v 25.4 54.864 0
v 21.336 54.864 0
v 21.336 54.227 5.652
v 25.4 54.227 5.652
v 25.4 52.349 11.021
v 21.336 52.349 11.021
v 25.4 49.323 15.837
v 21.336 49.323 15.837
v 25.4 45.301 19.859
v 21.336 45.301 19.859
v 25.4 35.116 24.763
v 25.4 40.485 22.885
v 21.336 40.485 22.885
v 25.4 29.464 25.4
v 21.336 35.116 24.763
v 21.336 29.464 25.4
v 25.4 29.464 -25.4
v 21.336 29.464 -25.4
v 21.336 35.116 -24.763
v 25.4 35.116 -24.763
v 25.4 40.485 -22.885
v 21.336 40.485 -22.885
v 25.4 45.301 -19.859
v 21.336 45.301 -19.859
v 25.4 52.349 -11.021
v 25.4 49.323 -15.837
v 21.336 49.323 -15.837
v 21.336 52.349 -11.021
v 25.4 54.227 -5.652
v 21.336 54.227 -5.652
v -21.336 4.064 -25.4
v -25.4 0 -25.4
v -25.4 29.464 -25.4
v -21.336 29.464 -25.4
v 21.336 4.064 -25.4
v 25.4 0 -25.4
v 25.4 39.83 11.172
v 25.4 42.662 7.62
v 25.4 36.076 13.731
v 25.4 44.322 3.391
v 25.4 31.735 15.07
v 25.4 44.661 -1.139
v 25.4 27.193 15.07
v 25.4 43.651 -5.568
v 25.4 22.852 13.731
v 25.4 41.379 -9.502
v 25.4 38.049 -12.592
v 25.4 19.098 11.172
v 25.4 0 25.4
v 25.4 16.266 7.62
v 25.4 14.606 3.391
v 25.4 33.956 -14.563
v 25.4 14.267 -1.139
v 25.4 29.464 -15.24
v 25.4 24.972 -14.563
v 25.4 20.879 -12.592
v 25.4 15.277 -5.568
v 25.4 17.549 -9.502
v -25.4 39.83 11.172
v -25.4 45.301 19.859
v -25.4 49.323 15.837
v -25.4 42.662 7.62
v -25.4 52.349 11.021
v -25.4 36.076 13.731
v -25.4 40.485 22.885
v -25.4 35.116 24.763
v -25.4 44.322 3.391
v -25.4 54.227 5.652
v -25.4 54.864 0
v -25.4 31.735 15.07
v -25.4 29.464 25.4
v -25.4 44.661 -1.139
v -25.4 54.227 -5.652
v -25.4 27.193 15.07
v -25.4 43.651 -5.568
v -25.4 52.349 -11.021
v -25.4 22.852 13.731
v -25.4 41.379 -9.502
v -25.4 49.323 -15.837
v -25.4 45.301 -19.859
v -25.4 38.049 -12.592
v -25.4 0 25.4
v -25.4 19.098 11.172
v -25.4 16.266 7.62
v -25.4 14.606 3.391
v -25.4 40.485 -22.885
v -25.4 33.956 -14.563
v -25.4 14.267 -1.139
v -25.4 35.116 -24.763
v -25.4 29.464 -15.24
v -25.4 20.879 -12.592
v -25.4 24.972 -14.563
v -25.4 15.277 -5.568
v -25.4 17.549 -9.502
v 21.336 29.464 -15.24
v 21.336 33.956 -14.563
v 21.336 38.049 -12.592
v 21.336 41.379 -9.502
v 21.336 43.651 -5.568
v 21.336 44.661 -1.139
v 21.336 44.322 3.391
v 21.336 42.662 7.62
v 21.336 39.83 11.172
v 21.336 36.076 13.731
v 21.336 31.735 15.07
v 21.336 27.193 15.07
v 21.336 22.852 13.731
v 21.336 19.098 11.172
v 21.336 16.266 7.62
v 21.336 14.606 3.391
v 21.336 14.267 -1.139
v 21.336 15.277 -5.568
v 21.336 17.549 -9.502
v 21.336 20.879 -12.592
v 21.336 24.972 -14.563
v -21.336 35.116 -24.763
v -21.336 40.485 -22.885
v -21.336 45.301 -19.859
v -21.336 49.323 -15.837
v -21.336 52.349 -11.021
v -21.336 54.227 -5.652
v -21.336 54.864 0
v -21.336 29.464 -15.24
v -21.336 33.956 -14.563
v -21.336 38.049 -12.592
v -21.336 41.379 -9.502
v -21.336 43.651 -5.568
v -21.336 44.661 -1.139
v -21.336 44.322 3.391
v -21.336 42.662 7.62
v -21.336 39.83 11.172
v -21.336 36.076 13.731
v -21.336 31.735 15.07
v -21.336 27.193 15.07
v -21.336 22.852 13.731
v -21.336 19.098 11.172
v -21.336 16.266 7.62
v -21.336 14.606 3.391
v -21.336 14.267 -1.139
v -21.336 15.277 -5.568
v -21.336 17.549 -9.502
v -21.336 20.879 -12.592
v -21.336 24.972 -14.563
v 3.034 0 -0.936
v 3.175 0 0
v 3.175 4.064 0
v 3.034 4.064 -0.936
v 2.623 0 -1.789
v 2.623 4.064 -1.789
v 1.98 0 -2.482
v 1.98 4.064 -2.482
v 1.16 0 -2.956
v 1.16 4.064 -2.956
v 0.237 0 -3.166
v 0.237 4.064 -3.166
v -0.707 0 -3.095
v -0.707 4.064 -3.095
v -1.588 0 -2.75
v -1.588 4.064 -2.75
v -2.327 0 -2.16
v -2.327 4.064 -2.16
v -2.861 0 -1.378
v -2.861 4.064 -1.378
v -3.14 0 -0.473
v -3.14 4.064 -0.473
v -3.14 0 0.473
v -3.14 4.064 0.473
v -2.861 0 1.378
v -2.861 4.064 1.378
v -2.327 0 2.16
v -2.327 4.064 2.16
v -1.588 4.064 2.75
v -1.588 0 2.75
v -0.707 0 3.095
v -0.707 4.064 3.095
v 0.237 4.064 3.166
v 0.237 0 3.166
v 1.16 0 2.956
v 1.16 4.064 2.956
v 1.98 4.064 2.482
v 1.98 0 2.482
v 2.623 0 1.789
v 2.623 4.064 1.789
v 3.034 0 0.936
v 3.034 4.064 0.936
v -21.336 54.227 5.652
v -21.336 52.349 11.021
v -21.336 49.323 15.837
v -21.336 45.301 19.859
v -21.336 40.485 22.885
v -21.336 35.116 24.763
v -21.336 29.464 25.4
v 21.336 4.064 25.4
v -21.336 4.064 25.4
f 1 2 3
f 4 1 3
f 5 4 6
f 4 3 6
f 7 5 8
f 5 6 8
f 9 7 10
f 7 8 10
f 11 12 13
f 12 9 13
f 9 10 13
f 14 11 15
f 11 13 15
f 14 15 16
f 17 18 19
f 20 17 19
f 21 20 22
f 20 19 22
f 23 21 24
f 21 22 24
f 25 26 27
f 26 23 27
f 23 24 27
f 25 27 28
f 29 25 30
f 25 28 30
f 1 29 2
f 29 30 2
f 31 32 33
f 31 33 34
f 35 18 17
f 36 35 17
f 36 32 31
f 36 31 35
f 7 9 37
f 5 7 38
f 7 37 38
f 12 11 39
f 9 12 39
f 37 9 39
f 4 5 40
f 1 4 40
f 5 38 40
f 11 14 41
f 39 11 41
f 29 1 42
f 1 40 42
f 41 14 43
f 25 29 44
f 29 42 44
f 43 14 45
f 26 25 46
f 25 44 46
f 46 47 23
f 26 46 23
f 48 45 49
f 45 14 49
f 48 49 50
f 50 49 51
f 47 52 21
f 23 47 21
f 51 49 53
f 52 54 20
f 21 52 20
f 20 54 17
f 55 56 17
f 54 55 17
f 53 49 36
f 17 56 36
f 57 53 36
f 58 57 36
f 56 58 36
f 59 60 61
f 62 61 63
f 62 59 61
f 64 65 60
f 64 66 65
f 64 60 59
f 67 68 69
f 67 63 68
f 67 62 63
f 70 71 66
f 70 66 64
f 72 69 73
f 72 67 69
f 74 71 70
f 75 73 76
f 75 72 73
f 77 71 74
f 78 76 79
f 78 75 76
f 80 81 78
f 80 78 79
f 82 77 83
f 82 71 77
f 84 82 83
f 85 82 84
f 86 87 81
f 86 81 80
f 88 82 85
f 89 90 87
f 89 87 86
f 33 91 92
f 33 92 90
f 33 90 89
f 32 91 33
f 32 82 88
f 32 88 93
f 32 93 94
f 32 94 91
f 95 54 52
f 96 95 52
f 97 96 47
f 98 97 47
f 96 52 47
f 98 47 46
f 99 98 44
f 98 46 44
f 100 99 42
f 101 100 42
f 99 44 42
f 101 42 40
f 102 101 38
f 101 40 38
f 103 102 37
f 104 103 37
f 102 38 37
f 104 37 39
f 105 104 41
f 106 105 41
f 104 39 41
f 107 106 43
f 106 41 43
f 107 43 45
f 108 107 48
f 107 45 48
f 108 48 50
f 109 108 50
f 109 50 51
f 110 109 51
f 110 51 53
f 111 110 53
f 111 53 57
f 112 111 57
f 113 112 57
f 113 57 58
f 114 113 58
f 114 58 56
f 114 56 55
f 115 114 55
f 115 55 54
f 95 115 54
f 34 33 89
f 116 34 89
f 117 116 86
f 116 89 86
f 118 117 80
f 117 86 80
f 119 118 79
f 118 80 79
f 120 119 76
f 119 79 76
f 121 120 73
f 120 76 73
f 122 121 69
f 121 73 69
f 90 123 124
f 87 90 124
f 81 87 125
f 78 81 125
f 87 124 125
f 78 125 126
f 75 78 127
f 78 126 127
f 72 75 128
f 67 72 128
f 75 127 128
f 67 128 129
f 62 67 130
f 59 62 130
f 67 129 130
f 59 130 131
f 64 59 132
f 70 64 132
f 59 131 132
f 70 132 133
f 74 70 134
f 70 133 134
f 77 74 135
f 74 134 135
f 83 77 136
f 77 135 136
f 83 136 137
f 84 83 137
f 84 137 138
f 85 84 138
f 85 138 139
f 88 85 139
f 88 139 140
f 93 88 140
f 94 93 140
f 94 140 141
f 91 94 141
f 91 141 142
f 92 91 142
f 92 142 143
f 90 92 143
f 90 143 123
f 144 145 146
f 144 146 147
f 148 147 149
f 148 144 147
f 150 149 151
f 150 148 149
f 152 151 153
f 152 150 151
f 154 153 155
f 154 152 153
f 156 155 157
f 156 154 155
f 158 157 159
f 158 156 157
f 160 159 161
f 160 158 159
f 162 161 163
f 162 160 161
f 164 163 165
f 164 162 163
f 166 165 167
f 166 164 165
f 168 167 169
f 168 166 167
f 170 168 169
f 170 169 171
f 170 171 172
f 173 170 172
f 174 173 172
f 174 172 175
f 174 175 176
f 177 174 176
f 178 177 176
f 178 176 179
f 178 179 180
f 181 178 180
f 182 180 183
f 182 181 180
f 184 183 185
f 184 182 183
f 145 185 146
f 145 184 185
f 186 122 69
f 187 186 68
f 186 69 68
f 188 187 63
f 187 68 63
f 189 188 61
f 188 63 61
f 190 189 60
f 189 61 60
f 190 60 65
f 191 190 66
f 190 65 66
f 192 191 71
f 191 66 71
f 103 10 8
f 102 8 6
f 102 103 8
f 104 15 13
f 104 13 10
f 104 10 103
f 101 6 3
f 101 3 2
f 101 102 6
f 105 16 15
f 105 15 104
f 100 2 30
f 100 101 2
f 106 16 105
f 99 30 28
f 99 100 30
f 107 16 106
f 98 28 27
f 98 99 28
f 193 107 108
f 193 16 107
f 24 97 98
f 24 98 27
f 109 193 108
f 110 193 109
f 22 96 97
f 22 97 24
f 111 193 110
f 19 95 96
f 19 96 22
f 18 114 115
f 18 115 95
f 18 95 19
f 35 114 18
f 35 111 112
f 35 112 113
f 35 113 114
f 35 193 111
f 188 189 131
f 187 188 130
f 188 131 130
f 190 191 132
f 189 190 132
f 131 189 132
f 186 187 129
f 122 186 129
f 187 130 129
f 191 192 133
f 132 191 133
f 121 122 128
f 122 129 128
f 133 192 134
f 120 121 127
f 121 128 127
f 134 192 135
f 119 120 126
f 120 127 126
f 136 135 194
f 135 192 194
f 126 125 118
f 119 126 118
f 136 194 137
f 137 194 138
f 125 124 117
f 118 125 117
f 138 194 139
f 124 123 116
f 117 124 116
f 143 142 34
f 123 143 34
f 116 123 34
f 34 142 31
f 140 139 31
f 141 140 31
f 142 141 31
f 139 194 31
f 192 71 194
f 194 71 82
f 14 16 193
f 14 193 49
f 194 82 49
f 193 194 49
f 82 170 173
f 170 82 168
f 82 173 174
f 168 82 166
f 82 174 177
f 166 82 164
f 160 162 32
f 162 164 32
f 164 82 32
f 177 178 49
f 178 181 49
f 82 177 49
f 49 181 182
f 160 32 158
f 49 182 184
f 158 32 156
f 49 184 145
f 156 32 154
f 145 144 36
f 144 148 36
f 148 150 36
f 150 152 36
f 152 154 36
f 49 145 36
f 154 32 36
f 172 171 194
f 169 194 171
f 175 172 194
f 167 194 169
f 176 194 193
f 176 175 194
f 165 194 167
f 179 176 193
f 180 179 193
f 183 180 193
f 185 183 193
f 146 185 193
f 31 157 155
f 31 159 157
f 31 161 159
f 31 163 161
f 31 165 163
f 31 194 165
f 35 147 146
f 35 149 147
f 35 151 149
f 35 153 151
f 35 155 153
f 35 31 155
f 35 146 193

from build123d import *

# Parameters (mm, degrees)
SKETCH1_W           = 50.8
SKETCH1_H           = 50.8
SKETCH1_R           = 3.175
BOSS_EXTRUDE1_DEPTH = 4.064
SKETCH2_W           = 4.064
SKETCH2_H           = 50.8
BOSS_EXTRUDE2_DEPTH = 50.8
SKETCH3_R           = 15.24
CUT_EXTRUDE1_DEPTH  = 51.8
CUT_EXTRUDE2_DEPTH  = 51.8


with BuildPart() as part:
    # Sketch1 → Boss-Extrude1 (new body)
    with BuildSketch(Plane(origin=(0, 0, 0), x_dir=(1, 0, 0), z_dir=(0, 1, 0))):
        Rectangle(SKETCH1_W, SKETCH1_H)
        Circle(SKETCH1_R, mode=Mode.SUBTRACT)
    extrude(amount=BOSS_EXTRUDE1_DEPTH)

    # Sketch2 → Boss-Extrude2 (add)
    with BuildSketch(Plane(origin=(0, 4.064, 0), x_dir=(1, 0, 0), z_dir=(0, 1, 0))):
        with Locations((-23.368, 0)):
            Rectangle(SKETCH2_W, SKETCH2_H)
        with Locations((23.368, 0)):
            Rectangle(SKETCH2_W, SKETCH2_H)
    extrude(amount=BOSS_EXTRUDE2_DEPTH)

    # Sketch3 → Cut-Extrude1 (cut, through all)
    with BuildSketch(Plane(origin=(25.4, 0, 0), x_dir=(0, 0, -1), z_dir=(1, 0, 0))):
        with Locations((0, 29.464)):
            Circle(SKETCH3_R)
    extrude(amount=-CUT_EXTRUDE1_DEPTH, mode=Mode.SUBTRACT)

    # Sketch4 → Cut-Extrude2 (cut, through all)
    with BuildSketch(Plane.ZY.offset(25.4)):
        with BuildLine():
            ThreePointArc((-25.4, 29.464), (-17.960512262, 47.424512222), (-5.6e-08, 54.864))
            Line((-5.6e-08, 54.864), (-25.4, 54.864))
            Line((-25.4, 54.864), (-25.4, 29.464))
        make_face()
        with BuildLine():
            ThreePointArc((-5.6e-08, 54.864), (17.960512222, 47.424512262), (25.4, 29.464))
            Line((25.4, 29.464), (25.4, 54.864))
            Line((25.4, 54.864), (-5.6e-08, 54.864))
        make_face()
    extrude(amount=-CUT_EXTRUDE2_DEPTH, mode=Mode.SUBTRACT)


solid = part.part
